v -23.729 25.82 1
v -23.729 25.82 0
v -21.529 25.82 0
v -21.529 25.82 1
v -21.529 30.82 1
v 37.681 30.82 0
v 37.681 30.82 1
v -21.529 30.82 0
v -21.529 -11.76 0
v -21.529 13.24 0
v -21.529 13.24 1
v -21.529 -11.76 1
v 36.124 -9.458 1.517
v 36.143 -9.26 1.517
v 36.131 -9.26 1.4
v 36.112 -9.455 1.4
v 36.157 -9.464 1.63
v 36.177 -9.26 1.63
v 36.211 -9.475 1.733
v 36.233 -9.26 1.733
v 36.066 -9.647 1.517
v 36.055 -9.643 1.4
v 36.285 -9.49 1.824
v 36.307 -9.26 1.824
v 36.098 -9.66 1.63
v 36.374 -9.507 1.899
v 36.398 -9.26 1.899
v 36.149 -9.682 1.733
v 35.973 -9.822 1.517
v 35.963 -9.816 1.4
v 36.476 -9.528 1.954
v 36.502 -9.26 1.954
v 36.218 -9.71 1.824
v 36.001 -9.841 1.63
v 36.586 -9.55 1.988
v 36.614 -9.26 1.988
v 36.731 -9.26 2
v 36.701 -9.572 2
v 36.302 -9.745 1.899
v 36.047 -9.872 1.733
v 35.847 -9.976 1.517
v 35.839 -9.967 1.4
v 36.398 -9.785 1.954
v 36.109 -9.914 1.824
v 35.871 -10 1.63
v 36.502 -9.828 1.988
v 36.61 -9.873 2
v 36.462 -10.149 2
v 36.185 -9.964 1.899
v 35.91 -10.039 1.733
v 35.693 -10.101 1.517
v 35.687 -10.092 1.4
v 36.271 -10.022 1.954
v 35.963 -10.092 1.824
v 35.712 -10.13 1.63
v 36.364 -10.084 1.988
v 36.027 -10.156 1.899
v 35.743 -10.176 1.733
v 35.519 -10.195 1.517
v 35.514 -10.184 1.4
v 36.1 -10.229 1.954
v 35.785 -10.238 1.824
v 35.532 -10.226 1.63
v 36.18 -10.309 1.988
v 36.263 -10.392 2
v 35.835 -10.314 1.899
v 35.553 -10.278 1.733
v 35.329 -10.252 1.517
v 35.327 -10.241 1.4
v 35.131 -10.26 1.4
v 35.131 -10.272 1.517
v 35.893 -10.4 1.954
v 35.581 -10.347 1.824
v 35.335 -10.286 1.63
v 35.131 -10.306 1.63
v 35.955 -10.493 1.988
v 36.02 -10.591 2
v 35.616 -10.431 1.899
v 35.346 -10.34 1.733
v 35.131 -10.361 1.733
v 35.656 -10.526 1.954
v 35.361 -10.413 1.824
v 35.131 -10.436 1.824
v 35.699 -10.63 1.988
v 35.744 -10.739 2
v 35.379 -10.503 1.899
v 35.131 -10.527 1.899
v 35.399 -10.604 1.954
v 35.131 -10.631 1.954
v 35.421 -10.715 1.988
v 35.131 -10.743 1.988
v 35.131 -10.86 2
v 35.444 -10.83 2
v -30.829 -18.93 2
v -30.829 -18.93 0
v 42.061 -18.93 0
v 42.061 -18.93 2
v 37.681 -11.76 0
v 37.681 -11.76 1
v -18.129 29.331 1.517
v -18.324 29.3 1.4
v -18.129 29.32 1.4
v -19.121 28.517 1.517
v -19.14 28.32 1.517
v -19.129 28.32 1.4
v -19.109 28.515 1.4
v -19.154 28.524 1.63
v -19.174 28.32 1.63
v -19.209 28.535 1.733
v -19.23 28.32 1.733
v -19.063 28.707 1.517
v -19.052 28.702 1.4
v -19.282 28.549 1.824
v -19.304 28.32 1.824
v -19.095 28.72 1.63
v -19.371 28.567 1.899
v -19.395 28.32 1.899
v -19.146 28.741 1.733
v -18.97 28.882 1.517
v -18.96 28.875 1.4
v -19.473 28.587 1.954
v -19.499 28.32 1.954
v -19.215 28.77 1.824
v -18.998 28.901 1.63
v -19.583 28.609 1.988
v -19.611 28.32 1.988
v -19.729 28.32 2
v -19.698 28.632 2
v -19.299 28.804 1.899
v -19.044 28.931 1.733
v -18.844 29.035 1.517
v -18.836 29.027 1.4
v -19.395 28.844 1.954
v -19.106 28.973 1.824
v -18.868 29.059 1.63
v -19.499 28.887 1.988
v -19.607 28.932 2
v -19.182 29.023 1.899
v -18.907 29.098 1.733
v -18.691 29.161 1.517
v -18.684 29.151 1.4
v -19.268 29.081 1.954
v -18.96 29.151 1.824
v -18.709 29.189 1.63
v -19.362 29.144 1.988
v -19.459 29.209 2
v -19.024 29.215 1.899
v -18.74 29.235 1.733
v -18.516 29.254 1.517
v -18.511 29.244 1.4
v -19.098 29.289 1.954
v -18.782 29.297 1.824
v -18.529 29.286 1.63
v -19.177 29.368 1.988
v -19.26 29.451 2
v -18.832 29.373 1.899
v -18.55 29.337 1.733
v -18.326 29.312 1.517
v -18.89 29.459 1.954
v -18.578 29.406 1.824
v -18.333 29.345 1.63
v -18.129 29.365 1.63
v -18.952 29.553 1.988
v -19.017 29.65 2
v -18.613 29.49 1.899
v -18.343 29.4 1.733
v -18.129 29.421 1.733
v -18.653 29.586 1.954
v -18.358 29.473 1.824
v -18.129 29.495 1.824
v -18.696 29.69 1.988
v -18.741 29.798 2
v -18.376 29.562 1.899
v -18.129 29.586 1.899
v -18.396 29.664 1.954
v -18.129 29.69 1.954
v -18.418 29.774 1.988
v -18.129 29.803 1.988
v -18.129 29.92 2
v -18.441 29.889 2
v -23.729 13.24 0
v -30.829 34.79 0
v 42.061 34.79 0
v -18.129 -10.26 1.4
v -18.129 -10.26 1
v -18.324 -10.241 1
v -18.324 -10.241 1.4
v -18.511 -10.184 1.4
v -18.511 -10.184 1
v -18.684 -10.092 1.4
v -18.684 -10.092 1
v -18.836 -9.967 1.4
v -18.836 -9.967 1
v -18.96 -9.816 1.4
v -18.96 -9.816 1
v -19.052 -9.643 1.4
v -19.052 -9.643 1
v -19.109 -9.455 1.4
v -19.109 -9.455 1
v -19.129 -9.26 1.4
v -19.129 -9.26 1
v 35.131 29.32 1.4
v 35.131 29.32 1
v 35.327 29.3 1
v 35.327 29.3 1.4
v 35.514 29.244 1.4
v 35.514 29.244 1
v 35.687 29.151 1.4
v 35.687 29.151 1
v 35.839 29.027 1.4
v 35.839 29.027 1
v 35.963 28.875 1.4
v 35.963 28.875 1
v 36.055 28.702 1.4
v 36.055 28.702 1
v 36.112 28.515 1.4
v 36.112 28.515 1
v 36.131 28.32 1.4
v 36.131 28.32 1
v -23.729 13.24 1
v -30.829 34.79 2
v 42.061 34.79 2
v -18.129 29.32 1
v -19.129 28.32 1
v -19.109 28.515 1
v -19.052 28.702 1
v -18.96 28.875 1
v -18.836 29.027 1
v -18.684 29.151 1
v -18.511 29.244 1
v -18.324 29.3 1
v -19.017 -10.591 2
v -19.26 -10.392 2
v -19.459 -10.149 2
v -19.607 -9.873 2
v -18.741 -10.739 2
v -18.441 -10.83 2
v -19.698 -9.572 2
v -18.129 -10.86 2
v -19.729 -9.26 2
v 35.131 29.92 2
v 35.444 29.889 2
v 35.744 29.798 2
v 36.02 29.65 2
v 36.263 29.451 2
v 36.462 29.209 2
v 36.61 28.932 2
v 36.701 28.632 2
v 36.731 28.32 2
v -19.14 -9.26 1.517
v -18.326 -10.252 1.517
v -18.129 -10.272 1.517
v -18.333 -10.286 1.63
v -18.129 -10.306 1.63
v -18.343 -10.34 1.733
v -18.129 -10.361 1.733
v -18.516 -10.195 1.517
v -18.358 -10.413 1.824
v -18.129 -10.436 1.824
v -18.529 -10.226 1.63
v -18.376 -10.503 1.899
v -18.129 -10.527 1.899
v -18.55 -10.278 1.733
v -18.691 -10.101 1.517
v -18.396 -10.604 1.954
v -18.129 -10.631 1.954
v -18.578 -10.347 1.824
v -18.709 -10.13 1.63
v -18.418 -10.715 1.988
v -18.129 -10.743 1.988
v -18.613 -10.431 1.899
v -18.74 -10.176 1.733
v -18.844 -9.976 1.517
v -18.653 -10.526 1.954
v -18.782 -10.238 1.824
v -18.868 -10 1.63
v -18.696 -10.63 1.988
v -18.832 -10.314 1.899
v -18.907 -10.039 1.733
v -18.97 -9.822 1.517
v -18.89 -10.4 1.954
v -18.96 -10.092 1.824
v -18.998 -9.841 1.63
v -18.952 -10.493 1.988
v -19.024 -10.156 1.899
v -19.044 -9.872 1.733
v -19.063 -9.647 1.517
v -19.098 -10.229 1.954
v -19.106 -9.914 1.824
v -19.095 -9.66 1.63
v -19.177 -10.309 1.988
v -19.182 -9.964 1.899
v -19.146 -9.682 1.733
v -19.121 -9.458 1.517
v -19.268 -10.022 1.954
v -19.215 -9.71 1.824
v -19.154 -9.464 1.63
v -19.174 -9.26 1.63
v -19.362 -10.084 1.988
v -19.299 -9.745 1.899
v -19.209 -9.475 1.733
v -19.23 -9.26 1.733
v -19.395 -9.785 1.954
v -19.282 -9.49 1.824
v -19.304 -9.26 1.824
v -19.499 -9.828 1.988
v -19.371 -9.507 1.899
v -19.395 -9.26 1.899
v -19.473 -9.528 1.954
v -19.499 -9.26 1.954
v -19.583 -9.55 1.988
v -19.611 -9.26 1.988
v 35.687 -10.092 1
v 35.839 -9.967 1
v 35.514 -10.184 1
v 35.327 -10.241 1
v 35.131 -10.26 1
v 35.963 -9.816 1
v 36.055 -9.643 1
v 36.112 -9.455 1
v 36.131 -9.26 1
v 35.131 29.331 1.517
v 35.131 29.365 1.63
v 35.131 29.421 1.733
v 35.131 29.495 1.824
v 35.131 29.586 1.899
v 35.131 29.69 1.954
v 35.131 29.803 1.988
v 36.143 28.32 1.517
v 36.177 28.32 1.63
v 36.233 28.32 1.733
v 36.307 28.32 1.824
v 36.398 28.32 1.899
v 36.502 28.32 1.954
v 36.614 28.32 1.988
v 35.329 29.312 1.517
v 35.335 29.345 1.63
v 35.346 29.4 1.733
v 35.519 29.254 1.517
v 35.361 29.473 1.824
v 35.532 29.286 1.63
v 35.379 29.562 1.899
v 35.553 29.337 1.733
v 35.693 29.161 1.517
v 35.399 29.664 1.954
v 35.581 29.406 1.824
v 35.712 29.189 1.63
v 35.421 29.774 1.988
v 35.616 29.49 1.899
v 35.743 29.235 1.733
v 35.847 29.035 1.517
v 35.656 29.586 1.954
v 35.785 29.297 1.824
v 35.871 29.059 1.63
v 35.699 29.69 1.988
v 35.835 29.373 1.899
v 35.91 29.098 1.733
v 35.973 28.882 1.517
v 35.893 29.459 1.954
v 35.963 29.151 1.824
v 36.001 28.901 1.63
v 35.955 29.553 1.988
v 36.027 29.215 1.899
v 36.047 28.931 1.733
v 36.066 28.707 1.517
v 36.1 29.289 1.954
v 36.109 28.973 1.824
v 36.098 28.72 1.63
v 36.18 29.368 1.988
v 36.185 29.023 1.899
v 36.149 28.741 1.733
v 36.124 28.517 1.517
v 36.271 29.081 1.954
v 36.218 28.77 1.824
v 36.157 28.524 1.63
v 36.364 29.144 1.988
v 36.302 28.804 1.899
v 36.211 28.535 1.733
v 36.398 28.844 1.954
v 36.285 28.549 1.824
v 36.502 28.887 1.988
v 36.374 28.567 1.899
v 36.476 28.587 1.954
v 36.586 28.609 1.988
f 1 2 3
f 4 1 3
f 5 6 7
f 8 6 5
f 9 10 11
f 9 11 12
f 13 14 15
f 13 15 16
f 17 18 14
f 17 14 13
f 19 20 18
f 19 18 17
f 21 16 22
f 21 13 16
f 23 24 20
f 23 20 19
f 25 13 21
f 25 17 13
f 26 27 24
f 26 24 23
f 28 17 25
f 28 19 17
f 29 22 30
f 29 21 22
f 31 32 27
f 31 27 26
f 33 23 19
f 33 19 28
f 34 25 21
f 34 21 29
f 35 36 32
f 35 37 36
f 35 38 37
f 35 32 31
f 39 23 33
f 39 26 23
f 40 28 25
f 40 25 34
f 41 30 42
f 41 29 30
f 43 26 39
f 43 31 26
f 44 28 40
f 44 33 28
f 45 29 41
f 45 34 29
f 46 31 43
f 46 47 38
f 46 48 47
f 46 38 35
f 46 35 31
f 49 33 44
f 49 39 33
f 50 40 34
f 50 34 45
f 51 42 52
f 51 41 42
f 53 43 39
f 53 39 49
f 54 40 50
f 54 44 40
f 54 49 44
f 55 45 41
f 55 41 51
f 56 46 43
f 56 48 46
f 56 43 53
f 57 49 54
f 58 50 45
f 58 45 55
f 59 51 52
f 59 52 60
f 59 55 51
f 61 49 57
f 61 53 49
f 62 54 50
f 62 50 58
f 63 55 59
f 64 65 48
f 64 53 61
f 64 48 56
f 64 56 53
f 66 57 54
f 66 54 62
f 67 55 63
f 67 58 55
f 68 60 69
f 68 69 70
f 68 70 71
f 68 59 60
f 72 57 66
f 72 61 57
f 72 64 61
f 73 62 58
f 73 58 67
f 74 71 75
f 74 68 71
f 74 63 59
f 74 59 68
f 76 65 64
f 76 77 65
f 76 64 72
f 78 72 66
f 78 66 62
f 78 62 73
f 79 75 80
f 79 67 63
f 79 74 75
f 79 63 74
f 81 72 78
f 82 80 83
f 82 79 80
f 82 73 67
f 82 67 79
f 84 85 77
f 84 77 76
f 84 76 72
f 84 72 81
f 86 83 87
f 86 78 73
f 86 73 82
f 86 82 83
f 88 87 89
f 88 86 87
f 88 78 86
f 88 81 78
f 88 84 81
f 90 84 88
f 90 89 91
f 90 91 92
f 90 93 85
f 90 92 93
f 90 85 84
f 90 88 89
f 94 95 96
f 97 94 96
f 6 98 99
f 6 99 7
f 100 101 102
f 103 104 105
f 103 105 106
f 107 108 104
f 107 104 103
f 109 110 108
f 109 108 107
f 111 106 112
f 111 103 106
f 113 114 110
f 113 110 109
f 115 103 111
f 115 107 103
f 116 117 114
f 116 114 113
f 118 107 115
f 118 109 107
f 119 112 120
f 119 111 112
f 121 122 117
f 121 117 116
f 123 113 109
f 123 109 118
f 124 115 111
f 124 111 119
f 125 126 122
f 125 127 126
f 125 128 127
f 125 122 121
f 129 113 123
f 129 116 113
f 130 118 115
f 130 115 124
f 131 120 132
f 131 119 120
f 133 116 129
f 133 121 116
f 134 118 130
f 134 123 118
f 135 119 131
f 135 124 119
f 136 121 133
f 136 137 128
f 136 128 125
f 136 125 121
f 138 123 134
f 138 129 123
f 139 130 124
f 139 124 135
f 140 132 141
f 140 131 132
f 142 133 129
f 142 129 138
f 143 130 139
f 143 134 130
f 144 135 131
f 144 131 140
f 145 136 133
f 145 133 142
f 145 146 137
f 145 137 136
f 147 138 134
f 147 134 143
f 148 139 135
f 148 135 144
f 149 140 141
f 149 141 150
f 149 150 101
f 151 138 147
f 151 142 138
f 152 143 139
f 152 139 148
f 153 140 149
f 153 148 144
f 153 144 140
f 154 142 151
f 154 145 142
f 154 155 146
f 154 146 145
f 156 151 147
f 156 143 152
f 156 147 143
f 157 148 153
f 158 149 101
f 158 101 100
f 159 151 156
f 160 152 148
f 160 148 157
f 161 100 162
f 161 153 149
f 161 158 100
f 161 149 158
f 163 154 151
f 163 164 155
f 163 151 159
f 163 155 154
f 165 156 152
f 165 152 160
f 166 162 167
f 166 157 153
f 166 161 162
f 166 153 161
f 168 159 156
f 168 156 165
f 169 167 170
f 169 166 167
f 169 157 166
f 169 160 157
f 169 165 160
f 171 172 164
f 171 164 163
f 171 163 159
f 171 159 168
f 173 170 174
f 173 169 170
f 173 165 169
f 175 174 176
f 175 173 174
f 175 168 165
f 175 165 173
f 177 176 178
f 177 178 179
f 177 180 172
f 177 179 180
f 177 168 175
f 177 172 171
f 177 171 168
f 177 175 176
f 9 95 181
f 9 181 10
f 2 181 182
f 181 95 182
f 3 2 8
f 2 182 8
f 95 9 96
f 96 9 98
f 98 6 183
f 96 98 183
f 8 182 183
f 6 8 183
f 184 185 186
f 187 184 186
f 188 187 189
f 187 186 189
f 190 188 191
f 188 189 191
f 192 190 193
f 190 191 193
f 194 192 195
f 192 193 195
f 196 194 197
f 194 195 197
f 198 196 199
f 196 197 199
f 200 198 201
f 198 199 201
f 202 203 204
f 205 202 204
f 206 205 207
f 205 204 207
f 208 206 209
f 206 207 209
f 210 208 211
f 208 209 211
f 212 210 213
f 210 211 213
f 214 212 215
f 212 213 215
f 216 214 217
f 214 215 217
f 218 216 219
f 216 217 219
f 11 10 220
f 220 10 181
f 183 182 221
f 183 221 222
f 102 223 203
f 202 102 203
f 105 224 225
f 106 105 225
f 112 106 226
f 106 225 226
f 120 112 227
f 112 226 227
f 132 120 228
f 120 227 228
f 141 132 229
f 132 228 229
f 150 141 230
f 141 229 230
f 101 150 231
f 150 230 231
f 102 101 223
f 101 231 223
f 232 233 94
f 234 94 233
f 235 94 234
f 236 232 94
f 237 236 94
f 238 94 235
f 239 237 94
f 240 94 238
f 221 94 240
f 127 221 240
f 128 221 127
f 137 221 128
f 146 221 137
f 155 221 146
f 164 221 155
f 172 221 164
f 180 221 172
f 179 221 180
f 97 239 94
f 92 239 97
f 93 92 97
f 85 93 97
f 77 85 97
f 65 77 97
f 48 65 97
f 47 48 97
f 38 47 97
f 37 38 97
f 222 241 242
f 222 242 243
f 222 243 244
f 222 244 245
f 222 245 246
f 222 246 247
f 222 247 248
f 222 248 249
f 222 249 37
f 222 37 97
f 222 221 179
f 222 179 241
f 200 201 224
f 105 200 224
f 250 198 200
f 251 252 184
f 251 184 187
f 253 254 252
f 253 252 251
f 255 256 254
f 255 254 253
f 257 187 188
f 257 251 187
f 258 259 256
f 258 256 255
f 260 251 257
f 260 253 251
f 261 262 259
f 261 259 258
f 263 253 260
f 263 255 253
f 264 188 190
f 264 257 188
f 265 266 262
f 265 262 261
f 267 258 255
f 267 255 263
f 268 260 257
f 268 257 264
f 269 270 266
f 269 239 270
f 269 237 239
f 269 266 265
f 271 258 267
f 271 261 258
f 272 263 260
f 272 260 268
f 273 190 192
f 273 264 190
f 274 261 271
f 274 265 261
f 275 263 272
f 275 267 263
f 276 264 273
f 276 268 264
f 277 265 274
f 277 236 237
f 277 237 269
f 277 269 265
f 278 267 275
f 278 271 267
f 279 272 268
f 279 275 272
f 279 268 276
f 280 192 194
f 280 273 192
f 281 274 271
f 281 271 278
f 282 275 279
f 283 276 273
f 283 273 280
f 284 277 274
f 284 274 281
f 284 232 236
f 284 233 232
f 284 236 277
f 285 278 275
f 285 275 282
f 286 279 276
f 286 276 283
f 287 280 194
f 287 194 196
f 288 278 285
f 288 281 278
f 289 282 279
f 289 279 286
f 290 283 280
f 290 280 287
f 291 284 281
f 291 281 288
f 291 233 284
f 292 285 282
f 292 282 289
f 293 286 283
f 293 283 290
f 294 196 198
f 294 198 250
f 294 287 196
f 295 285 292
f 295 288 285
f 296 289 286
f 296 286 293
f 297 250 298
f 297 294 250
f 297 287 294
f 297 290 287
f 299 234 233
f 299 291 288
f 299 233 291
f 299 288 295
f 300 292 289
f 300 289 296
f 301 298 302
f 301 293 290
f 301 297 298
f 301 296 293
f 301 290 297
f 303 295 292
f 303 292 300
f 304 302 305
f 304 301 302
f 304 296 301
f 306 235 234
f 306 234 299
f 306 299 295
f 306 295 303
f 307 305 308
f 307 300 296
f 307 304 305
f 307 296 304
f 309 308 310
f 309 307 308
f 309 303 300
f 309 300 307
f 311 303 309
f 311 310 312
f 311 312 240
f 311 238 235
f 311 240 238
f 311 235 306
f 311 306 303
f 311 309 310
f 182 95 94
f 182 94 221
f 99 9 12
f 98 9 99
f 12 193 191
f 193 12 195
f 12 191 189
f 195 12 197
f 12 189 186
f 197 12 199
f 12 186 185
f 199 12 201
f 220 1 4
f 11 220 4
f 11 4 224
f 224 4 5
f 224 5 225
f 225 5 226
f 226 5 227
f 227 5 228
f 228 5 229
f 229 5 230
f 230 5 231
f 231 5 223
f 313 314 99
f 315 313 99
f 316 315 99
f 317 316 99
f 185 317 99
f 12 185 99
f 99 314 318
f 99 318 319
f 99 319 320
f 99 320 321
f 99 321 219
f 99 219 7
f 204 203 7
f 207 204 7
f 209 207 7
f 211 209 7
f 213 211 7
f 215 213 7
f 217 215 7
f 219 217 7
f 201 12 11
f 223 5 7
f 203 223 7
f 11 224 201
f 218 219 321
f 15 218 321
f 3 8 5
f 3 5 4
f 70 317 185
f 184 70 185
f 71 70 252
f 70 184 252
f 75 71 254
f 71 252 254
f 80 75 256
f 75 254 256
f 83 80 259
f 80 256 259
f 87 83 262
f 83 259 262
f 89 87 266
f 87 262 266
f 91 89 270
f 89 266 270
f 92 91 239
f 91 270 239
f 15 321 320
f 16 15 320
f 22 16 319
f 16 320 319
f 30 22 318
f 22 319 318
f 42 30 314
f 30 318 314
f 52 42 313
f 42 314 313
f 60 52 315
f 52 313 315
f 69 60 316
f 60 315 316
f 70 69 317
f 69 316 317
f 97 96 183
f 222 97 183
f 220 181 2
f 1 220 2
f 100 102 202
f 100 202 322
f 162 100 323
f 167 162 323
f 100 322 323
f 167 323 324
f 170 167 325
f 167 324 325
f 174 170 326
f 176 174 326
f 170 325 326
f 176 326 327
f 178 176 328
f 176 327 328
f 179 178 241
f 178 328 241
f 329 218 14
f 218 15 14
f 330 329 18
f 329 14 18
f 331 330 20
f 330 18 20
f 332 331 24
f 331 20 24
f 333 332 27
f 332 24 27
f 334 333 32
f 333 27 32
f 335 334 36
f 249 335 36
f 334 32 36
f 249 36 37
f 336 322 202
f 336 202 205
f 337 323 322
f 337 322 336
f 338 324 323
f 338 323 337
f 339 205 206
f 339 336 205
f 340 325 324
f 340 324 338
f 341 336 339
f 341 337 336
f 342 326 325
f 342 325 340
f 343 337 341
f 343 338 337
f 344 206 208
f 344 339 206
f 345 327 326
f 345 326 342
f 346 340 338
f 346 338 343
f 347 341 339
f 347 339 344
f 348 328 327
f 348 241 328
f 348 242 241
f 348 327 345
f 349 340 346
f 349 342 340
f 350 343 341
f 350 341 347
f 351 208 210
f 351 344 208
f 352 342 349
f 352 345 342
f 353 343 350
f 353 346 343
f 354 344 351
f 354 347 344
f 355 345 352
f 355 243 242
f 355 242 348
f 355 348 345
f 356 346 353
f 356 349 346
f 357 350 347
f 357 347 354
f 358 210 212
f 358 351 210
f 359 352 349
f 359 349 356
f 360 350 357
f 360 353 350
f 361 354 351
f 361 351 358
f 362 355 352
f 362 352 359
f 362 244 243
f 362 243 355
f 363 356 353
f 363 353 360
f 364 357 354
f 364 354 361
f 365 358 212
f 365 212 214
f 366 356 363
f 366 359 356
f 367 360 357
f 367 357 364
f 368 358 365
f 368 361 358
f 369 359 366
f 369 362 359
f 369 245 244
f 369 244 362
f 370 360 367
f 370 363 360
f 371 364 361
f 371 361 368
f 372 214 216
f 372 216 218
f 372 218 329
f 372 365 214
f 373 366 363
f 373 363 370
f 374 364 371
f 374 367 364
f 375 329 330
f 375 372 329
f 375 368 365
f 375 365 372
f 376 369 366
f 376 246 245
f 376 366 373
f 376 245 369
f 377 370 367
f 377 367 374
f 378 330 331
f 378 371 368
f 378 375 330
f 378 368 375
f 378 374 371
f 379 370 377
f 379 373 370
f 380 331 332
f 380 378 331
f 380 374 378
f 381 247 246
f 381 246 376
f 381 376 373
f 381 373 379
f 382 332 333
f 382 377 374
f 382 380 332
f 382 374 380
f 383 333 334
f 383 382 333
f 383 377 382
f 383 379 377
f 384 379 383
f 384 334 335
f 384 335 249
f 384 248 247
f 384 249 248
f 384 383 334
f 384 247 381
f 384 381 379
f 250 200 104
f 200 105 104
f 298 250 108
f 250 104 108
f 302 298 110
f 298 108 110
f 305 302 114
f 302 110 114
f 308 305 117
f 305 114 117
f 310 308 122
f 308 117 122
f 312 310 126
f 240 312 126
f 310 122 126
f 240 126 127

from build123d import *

# Parameters (mm, degrees)
F0_W     = 72.89
F0_H     = 53.72
F1_DEPTH = 2
F2_DEPTH = 1
F3_START = 1
F0_W_2   = 2.2
F0_H_2   = 12.58
F3_DEPTH = 1
F4_R     = 0.6


with BuildPart() as f1:
    # F0 (on Top) → F1 (new body)
    with BuildSketch(Plane.XY):
        with Locations((5.6164505921, 7.9296875)):
            Rectangle(F0_W, F0_H)
        Polygon((-21.5285494079, 30.8196875), (37.6814505921, 30.8196875), (37.6814505921, -11.7603125), (-21.5285494079, -11.7603125), (-21.5285494079, 13.2396875), (-23.7285494079, 13.2396875), (-23.7285494079, 25.8196875), (-21.5285494079, 25.8196875), align=None, mode=Mode.SUBTRACT)
        Polygon((37.6814505921, -11.7603125), (37.6814505921, 30.8196875), (-21.5285494079, 30.8196875), (-21.5285494079, 25.8196875), (-21.5285494079, 13.2396875), (-21.5285494079, -11.7603125), align=None)
        with BuildLine():
            ThreePointArc((-19.1285494079, 28.3196875), (-18.835656189, 29.0267942812), (-18.1285494079, 29.3196875))
            Line((-18.1285494079, 29.3196875), (35.1314505921, 29.3196875))
            ThreePointArc((35.1314505921, 29.3196875), (35.8385573733, 29.0267942812), (36.1314505921, 28.3196875))
            Line((36.1314505921, 28.3196875), (36.1314505921, -9.2603125))
            ThreePointArc((36.1314505921, -9.2603125), (35.8385573733, -9.9674192812), (35.1314505921, -10.2603125))
            Line((35.1314505921, -10.2603125), (-18.1285494079, -10.2603125))
            ThreePointArc((-18.1285494079, -10.2603125), (-18.835656189, -9.9674192812), (-19.1285494079, -9.2603125))
            Line((-19.1285494079, -9.2603125), (-19.1285494079, 28.3196875))
        make_face(mode=Mode.SUBTRACT)
    extrude(amount=F1_DEPTH)

    # F0 (on Top) → F2 (cut)
    with BuildSketch(Plane.XY):
        Polygon((37.6814505921, -11.7603125), (37.6814505921, 30.8196875), (-21.5285494079, 30.8196875), (-21.5285494079, 25.8196875), (-21.5285494079, 13.2396875), (-21.5285494079, -11.7603125), align=None)
        with BuildLine():
            ThreePointArc((-19.1285494079, 28.3196875), (-18.835656189, 29.0267942812), (-18.1285494079, 29.3196875))
            Line((-18.1285494079, 29.3196875), (35.1314505921, 29.3196875))
            ThreePointArc((35.1314505921, 29.3196875), (35.8385573733, 29.0267942812), (36.1314505921, 28.3196875))
            Line((36.1314505921, 28.3196875), (36.1314505921, -9.2603125))
            ThreePointArc((36.1314505921, -9.2603125), (35.8385573733, -9.9674192812), (35.1314505921, -10.2603125))
            Line((35.1314505921, -10.2603125), (-18.1285494079, -10.2603125))
            ThreePointArc((-18.1285494079, -10.2603125), (-18.835656189, -9.9674192812), (-19.1285494079, -9.2603125))
            Line((-19.1285494079, -9.2603125), (-19.1285494079, 28.3196875))
        make_face(mode=Mode.SUBTRACT)
    extrude(amount=F2_DEPTH, mode=Mode.SUBTRACT)

    # F0 (on Top) → F3 (join)
    with BuildSketch(Plane.XY.offset(F3_START)):
        with Locations((-22.6285494079, 19.5296875)):
            Rectangle(F0_W_2, F0_H_2)
    extrude(amount=F3_DEPTH)

    # F4
    f4_edges = [f1.edges().sort_by_distance(p)[0] for p in [
        (8.501451, 29.319688, 2),
        (-19.128549, 9.529688, 2),
        (8.501451, -10.260312, 2),
        (36.131451, 9.529688, 2),
    ]]
    fillet(f4_edges, radius=F4_R)


solid = f1.part
